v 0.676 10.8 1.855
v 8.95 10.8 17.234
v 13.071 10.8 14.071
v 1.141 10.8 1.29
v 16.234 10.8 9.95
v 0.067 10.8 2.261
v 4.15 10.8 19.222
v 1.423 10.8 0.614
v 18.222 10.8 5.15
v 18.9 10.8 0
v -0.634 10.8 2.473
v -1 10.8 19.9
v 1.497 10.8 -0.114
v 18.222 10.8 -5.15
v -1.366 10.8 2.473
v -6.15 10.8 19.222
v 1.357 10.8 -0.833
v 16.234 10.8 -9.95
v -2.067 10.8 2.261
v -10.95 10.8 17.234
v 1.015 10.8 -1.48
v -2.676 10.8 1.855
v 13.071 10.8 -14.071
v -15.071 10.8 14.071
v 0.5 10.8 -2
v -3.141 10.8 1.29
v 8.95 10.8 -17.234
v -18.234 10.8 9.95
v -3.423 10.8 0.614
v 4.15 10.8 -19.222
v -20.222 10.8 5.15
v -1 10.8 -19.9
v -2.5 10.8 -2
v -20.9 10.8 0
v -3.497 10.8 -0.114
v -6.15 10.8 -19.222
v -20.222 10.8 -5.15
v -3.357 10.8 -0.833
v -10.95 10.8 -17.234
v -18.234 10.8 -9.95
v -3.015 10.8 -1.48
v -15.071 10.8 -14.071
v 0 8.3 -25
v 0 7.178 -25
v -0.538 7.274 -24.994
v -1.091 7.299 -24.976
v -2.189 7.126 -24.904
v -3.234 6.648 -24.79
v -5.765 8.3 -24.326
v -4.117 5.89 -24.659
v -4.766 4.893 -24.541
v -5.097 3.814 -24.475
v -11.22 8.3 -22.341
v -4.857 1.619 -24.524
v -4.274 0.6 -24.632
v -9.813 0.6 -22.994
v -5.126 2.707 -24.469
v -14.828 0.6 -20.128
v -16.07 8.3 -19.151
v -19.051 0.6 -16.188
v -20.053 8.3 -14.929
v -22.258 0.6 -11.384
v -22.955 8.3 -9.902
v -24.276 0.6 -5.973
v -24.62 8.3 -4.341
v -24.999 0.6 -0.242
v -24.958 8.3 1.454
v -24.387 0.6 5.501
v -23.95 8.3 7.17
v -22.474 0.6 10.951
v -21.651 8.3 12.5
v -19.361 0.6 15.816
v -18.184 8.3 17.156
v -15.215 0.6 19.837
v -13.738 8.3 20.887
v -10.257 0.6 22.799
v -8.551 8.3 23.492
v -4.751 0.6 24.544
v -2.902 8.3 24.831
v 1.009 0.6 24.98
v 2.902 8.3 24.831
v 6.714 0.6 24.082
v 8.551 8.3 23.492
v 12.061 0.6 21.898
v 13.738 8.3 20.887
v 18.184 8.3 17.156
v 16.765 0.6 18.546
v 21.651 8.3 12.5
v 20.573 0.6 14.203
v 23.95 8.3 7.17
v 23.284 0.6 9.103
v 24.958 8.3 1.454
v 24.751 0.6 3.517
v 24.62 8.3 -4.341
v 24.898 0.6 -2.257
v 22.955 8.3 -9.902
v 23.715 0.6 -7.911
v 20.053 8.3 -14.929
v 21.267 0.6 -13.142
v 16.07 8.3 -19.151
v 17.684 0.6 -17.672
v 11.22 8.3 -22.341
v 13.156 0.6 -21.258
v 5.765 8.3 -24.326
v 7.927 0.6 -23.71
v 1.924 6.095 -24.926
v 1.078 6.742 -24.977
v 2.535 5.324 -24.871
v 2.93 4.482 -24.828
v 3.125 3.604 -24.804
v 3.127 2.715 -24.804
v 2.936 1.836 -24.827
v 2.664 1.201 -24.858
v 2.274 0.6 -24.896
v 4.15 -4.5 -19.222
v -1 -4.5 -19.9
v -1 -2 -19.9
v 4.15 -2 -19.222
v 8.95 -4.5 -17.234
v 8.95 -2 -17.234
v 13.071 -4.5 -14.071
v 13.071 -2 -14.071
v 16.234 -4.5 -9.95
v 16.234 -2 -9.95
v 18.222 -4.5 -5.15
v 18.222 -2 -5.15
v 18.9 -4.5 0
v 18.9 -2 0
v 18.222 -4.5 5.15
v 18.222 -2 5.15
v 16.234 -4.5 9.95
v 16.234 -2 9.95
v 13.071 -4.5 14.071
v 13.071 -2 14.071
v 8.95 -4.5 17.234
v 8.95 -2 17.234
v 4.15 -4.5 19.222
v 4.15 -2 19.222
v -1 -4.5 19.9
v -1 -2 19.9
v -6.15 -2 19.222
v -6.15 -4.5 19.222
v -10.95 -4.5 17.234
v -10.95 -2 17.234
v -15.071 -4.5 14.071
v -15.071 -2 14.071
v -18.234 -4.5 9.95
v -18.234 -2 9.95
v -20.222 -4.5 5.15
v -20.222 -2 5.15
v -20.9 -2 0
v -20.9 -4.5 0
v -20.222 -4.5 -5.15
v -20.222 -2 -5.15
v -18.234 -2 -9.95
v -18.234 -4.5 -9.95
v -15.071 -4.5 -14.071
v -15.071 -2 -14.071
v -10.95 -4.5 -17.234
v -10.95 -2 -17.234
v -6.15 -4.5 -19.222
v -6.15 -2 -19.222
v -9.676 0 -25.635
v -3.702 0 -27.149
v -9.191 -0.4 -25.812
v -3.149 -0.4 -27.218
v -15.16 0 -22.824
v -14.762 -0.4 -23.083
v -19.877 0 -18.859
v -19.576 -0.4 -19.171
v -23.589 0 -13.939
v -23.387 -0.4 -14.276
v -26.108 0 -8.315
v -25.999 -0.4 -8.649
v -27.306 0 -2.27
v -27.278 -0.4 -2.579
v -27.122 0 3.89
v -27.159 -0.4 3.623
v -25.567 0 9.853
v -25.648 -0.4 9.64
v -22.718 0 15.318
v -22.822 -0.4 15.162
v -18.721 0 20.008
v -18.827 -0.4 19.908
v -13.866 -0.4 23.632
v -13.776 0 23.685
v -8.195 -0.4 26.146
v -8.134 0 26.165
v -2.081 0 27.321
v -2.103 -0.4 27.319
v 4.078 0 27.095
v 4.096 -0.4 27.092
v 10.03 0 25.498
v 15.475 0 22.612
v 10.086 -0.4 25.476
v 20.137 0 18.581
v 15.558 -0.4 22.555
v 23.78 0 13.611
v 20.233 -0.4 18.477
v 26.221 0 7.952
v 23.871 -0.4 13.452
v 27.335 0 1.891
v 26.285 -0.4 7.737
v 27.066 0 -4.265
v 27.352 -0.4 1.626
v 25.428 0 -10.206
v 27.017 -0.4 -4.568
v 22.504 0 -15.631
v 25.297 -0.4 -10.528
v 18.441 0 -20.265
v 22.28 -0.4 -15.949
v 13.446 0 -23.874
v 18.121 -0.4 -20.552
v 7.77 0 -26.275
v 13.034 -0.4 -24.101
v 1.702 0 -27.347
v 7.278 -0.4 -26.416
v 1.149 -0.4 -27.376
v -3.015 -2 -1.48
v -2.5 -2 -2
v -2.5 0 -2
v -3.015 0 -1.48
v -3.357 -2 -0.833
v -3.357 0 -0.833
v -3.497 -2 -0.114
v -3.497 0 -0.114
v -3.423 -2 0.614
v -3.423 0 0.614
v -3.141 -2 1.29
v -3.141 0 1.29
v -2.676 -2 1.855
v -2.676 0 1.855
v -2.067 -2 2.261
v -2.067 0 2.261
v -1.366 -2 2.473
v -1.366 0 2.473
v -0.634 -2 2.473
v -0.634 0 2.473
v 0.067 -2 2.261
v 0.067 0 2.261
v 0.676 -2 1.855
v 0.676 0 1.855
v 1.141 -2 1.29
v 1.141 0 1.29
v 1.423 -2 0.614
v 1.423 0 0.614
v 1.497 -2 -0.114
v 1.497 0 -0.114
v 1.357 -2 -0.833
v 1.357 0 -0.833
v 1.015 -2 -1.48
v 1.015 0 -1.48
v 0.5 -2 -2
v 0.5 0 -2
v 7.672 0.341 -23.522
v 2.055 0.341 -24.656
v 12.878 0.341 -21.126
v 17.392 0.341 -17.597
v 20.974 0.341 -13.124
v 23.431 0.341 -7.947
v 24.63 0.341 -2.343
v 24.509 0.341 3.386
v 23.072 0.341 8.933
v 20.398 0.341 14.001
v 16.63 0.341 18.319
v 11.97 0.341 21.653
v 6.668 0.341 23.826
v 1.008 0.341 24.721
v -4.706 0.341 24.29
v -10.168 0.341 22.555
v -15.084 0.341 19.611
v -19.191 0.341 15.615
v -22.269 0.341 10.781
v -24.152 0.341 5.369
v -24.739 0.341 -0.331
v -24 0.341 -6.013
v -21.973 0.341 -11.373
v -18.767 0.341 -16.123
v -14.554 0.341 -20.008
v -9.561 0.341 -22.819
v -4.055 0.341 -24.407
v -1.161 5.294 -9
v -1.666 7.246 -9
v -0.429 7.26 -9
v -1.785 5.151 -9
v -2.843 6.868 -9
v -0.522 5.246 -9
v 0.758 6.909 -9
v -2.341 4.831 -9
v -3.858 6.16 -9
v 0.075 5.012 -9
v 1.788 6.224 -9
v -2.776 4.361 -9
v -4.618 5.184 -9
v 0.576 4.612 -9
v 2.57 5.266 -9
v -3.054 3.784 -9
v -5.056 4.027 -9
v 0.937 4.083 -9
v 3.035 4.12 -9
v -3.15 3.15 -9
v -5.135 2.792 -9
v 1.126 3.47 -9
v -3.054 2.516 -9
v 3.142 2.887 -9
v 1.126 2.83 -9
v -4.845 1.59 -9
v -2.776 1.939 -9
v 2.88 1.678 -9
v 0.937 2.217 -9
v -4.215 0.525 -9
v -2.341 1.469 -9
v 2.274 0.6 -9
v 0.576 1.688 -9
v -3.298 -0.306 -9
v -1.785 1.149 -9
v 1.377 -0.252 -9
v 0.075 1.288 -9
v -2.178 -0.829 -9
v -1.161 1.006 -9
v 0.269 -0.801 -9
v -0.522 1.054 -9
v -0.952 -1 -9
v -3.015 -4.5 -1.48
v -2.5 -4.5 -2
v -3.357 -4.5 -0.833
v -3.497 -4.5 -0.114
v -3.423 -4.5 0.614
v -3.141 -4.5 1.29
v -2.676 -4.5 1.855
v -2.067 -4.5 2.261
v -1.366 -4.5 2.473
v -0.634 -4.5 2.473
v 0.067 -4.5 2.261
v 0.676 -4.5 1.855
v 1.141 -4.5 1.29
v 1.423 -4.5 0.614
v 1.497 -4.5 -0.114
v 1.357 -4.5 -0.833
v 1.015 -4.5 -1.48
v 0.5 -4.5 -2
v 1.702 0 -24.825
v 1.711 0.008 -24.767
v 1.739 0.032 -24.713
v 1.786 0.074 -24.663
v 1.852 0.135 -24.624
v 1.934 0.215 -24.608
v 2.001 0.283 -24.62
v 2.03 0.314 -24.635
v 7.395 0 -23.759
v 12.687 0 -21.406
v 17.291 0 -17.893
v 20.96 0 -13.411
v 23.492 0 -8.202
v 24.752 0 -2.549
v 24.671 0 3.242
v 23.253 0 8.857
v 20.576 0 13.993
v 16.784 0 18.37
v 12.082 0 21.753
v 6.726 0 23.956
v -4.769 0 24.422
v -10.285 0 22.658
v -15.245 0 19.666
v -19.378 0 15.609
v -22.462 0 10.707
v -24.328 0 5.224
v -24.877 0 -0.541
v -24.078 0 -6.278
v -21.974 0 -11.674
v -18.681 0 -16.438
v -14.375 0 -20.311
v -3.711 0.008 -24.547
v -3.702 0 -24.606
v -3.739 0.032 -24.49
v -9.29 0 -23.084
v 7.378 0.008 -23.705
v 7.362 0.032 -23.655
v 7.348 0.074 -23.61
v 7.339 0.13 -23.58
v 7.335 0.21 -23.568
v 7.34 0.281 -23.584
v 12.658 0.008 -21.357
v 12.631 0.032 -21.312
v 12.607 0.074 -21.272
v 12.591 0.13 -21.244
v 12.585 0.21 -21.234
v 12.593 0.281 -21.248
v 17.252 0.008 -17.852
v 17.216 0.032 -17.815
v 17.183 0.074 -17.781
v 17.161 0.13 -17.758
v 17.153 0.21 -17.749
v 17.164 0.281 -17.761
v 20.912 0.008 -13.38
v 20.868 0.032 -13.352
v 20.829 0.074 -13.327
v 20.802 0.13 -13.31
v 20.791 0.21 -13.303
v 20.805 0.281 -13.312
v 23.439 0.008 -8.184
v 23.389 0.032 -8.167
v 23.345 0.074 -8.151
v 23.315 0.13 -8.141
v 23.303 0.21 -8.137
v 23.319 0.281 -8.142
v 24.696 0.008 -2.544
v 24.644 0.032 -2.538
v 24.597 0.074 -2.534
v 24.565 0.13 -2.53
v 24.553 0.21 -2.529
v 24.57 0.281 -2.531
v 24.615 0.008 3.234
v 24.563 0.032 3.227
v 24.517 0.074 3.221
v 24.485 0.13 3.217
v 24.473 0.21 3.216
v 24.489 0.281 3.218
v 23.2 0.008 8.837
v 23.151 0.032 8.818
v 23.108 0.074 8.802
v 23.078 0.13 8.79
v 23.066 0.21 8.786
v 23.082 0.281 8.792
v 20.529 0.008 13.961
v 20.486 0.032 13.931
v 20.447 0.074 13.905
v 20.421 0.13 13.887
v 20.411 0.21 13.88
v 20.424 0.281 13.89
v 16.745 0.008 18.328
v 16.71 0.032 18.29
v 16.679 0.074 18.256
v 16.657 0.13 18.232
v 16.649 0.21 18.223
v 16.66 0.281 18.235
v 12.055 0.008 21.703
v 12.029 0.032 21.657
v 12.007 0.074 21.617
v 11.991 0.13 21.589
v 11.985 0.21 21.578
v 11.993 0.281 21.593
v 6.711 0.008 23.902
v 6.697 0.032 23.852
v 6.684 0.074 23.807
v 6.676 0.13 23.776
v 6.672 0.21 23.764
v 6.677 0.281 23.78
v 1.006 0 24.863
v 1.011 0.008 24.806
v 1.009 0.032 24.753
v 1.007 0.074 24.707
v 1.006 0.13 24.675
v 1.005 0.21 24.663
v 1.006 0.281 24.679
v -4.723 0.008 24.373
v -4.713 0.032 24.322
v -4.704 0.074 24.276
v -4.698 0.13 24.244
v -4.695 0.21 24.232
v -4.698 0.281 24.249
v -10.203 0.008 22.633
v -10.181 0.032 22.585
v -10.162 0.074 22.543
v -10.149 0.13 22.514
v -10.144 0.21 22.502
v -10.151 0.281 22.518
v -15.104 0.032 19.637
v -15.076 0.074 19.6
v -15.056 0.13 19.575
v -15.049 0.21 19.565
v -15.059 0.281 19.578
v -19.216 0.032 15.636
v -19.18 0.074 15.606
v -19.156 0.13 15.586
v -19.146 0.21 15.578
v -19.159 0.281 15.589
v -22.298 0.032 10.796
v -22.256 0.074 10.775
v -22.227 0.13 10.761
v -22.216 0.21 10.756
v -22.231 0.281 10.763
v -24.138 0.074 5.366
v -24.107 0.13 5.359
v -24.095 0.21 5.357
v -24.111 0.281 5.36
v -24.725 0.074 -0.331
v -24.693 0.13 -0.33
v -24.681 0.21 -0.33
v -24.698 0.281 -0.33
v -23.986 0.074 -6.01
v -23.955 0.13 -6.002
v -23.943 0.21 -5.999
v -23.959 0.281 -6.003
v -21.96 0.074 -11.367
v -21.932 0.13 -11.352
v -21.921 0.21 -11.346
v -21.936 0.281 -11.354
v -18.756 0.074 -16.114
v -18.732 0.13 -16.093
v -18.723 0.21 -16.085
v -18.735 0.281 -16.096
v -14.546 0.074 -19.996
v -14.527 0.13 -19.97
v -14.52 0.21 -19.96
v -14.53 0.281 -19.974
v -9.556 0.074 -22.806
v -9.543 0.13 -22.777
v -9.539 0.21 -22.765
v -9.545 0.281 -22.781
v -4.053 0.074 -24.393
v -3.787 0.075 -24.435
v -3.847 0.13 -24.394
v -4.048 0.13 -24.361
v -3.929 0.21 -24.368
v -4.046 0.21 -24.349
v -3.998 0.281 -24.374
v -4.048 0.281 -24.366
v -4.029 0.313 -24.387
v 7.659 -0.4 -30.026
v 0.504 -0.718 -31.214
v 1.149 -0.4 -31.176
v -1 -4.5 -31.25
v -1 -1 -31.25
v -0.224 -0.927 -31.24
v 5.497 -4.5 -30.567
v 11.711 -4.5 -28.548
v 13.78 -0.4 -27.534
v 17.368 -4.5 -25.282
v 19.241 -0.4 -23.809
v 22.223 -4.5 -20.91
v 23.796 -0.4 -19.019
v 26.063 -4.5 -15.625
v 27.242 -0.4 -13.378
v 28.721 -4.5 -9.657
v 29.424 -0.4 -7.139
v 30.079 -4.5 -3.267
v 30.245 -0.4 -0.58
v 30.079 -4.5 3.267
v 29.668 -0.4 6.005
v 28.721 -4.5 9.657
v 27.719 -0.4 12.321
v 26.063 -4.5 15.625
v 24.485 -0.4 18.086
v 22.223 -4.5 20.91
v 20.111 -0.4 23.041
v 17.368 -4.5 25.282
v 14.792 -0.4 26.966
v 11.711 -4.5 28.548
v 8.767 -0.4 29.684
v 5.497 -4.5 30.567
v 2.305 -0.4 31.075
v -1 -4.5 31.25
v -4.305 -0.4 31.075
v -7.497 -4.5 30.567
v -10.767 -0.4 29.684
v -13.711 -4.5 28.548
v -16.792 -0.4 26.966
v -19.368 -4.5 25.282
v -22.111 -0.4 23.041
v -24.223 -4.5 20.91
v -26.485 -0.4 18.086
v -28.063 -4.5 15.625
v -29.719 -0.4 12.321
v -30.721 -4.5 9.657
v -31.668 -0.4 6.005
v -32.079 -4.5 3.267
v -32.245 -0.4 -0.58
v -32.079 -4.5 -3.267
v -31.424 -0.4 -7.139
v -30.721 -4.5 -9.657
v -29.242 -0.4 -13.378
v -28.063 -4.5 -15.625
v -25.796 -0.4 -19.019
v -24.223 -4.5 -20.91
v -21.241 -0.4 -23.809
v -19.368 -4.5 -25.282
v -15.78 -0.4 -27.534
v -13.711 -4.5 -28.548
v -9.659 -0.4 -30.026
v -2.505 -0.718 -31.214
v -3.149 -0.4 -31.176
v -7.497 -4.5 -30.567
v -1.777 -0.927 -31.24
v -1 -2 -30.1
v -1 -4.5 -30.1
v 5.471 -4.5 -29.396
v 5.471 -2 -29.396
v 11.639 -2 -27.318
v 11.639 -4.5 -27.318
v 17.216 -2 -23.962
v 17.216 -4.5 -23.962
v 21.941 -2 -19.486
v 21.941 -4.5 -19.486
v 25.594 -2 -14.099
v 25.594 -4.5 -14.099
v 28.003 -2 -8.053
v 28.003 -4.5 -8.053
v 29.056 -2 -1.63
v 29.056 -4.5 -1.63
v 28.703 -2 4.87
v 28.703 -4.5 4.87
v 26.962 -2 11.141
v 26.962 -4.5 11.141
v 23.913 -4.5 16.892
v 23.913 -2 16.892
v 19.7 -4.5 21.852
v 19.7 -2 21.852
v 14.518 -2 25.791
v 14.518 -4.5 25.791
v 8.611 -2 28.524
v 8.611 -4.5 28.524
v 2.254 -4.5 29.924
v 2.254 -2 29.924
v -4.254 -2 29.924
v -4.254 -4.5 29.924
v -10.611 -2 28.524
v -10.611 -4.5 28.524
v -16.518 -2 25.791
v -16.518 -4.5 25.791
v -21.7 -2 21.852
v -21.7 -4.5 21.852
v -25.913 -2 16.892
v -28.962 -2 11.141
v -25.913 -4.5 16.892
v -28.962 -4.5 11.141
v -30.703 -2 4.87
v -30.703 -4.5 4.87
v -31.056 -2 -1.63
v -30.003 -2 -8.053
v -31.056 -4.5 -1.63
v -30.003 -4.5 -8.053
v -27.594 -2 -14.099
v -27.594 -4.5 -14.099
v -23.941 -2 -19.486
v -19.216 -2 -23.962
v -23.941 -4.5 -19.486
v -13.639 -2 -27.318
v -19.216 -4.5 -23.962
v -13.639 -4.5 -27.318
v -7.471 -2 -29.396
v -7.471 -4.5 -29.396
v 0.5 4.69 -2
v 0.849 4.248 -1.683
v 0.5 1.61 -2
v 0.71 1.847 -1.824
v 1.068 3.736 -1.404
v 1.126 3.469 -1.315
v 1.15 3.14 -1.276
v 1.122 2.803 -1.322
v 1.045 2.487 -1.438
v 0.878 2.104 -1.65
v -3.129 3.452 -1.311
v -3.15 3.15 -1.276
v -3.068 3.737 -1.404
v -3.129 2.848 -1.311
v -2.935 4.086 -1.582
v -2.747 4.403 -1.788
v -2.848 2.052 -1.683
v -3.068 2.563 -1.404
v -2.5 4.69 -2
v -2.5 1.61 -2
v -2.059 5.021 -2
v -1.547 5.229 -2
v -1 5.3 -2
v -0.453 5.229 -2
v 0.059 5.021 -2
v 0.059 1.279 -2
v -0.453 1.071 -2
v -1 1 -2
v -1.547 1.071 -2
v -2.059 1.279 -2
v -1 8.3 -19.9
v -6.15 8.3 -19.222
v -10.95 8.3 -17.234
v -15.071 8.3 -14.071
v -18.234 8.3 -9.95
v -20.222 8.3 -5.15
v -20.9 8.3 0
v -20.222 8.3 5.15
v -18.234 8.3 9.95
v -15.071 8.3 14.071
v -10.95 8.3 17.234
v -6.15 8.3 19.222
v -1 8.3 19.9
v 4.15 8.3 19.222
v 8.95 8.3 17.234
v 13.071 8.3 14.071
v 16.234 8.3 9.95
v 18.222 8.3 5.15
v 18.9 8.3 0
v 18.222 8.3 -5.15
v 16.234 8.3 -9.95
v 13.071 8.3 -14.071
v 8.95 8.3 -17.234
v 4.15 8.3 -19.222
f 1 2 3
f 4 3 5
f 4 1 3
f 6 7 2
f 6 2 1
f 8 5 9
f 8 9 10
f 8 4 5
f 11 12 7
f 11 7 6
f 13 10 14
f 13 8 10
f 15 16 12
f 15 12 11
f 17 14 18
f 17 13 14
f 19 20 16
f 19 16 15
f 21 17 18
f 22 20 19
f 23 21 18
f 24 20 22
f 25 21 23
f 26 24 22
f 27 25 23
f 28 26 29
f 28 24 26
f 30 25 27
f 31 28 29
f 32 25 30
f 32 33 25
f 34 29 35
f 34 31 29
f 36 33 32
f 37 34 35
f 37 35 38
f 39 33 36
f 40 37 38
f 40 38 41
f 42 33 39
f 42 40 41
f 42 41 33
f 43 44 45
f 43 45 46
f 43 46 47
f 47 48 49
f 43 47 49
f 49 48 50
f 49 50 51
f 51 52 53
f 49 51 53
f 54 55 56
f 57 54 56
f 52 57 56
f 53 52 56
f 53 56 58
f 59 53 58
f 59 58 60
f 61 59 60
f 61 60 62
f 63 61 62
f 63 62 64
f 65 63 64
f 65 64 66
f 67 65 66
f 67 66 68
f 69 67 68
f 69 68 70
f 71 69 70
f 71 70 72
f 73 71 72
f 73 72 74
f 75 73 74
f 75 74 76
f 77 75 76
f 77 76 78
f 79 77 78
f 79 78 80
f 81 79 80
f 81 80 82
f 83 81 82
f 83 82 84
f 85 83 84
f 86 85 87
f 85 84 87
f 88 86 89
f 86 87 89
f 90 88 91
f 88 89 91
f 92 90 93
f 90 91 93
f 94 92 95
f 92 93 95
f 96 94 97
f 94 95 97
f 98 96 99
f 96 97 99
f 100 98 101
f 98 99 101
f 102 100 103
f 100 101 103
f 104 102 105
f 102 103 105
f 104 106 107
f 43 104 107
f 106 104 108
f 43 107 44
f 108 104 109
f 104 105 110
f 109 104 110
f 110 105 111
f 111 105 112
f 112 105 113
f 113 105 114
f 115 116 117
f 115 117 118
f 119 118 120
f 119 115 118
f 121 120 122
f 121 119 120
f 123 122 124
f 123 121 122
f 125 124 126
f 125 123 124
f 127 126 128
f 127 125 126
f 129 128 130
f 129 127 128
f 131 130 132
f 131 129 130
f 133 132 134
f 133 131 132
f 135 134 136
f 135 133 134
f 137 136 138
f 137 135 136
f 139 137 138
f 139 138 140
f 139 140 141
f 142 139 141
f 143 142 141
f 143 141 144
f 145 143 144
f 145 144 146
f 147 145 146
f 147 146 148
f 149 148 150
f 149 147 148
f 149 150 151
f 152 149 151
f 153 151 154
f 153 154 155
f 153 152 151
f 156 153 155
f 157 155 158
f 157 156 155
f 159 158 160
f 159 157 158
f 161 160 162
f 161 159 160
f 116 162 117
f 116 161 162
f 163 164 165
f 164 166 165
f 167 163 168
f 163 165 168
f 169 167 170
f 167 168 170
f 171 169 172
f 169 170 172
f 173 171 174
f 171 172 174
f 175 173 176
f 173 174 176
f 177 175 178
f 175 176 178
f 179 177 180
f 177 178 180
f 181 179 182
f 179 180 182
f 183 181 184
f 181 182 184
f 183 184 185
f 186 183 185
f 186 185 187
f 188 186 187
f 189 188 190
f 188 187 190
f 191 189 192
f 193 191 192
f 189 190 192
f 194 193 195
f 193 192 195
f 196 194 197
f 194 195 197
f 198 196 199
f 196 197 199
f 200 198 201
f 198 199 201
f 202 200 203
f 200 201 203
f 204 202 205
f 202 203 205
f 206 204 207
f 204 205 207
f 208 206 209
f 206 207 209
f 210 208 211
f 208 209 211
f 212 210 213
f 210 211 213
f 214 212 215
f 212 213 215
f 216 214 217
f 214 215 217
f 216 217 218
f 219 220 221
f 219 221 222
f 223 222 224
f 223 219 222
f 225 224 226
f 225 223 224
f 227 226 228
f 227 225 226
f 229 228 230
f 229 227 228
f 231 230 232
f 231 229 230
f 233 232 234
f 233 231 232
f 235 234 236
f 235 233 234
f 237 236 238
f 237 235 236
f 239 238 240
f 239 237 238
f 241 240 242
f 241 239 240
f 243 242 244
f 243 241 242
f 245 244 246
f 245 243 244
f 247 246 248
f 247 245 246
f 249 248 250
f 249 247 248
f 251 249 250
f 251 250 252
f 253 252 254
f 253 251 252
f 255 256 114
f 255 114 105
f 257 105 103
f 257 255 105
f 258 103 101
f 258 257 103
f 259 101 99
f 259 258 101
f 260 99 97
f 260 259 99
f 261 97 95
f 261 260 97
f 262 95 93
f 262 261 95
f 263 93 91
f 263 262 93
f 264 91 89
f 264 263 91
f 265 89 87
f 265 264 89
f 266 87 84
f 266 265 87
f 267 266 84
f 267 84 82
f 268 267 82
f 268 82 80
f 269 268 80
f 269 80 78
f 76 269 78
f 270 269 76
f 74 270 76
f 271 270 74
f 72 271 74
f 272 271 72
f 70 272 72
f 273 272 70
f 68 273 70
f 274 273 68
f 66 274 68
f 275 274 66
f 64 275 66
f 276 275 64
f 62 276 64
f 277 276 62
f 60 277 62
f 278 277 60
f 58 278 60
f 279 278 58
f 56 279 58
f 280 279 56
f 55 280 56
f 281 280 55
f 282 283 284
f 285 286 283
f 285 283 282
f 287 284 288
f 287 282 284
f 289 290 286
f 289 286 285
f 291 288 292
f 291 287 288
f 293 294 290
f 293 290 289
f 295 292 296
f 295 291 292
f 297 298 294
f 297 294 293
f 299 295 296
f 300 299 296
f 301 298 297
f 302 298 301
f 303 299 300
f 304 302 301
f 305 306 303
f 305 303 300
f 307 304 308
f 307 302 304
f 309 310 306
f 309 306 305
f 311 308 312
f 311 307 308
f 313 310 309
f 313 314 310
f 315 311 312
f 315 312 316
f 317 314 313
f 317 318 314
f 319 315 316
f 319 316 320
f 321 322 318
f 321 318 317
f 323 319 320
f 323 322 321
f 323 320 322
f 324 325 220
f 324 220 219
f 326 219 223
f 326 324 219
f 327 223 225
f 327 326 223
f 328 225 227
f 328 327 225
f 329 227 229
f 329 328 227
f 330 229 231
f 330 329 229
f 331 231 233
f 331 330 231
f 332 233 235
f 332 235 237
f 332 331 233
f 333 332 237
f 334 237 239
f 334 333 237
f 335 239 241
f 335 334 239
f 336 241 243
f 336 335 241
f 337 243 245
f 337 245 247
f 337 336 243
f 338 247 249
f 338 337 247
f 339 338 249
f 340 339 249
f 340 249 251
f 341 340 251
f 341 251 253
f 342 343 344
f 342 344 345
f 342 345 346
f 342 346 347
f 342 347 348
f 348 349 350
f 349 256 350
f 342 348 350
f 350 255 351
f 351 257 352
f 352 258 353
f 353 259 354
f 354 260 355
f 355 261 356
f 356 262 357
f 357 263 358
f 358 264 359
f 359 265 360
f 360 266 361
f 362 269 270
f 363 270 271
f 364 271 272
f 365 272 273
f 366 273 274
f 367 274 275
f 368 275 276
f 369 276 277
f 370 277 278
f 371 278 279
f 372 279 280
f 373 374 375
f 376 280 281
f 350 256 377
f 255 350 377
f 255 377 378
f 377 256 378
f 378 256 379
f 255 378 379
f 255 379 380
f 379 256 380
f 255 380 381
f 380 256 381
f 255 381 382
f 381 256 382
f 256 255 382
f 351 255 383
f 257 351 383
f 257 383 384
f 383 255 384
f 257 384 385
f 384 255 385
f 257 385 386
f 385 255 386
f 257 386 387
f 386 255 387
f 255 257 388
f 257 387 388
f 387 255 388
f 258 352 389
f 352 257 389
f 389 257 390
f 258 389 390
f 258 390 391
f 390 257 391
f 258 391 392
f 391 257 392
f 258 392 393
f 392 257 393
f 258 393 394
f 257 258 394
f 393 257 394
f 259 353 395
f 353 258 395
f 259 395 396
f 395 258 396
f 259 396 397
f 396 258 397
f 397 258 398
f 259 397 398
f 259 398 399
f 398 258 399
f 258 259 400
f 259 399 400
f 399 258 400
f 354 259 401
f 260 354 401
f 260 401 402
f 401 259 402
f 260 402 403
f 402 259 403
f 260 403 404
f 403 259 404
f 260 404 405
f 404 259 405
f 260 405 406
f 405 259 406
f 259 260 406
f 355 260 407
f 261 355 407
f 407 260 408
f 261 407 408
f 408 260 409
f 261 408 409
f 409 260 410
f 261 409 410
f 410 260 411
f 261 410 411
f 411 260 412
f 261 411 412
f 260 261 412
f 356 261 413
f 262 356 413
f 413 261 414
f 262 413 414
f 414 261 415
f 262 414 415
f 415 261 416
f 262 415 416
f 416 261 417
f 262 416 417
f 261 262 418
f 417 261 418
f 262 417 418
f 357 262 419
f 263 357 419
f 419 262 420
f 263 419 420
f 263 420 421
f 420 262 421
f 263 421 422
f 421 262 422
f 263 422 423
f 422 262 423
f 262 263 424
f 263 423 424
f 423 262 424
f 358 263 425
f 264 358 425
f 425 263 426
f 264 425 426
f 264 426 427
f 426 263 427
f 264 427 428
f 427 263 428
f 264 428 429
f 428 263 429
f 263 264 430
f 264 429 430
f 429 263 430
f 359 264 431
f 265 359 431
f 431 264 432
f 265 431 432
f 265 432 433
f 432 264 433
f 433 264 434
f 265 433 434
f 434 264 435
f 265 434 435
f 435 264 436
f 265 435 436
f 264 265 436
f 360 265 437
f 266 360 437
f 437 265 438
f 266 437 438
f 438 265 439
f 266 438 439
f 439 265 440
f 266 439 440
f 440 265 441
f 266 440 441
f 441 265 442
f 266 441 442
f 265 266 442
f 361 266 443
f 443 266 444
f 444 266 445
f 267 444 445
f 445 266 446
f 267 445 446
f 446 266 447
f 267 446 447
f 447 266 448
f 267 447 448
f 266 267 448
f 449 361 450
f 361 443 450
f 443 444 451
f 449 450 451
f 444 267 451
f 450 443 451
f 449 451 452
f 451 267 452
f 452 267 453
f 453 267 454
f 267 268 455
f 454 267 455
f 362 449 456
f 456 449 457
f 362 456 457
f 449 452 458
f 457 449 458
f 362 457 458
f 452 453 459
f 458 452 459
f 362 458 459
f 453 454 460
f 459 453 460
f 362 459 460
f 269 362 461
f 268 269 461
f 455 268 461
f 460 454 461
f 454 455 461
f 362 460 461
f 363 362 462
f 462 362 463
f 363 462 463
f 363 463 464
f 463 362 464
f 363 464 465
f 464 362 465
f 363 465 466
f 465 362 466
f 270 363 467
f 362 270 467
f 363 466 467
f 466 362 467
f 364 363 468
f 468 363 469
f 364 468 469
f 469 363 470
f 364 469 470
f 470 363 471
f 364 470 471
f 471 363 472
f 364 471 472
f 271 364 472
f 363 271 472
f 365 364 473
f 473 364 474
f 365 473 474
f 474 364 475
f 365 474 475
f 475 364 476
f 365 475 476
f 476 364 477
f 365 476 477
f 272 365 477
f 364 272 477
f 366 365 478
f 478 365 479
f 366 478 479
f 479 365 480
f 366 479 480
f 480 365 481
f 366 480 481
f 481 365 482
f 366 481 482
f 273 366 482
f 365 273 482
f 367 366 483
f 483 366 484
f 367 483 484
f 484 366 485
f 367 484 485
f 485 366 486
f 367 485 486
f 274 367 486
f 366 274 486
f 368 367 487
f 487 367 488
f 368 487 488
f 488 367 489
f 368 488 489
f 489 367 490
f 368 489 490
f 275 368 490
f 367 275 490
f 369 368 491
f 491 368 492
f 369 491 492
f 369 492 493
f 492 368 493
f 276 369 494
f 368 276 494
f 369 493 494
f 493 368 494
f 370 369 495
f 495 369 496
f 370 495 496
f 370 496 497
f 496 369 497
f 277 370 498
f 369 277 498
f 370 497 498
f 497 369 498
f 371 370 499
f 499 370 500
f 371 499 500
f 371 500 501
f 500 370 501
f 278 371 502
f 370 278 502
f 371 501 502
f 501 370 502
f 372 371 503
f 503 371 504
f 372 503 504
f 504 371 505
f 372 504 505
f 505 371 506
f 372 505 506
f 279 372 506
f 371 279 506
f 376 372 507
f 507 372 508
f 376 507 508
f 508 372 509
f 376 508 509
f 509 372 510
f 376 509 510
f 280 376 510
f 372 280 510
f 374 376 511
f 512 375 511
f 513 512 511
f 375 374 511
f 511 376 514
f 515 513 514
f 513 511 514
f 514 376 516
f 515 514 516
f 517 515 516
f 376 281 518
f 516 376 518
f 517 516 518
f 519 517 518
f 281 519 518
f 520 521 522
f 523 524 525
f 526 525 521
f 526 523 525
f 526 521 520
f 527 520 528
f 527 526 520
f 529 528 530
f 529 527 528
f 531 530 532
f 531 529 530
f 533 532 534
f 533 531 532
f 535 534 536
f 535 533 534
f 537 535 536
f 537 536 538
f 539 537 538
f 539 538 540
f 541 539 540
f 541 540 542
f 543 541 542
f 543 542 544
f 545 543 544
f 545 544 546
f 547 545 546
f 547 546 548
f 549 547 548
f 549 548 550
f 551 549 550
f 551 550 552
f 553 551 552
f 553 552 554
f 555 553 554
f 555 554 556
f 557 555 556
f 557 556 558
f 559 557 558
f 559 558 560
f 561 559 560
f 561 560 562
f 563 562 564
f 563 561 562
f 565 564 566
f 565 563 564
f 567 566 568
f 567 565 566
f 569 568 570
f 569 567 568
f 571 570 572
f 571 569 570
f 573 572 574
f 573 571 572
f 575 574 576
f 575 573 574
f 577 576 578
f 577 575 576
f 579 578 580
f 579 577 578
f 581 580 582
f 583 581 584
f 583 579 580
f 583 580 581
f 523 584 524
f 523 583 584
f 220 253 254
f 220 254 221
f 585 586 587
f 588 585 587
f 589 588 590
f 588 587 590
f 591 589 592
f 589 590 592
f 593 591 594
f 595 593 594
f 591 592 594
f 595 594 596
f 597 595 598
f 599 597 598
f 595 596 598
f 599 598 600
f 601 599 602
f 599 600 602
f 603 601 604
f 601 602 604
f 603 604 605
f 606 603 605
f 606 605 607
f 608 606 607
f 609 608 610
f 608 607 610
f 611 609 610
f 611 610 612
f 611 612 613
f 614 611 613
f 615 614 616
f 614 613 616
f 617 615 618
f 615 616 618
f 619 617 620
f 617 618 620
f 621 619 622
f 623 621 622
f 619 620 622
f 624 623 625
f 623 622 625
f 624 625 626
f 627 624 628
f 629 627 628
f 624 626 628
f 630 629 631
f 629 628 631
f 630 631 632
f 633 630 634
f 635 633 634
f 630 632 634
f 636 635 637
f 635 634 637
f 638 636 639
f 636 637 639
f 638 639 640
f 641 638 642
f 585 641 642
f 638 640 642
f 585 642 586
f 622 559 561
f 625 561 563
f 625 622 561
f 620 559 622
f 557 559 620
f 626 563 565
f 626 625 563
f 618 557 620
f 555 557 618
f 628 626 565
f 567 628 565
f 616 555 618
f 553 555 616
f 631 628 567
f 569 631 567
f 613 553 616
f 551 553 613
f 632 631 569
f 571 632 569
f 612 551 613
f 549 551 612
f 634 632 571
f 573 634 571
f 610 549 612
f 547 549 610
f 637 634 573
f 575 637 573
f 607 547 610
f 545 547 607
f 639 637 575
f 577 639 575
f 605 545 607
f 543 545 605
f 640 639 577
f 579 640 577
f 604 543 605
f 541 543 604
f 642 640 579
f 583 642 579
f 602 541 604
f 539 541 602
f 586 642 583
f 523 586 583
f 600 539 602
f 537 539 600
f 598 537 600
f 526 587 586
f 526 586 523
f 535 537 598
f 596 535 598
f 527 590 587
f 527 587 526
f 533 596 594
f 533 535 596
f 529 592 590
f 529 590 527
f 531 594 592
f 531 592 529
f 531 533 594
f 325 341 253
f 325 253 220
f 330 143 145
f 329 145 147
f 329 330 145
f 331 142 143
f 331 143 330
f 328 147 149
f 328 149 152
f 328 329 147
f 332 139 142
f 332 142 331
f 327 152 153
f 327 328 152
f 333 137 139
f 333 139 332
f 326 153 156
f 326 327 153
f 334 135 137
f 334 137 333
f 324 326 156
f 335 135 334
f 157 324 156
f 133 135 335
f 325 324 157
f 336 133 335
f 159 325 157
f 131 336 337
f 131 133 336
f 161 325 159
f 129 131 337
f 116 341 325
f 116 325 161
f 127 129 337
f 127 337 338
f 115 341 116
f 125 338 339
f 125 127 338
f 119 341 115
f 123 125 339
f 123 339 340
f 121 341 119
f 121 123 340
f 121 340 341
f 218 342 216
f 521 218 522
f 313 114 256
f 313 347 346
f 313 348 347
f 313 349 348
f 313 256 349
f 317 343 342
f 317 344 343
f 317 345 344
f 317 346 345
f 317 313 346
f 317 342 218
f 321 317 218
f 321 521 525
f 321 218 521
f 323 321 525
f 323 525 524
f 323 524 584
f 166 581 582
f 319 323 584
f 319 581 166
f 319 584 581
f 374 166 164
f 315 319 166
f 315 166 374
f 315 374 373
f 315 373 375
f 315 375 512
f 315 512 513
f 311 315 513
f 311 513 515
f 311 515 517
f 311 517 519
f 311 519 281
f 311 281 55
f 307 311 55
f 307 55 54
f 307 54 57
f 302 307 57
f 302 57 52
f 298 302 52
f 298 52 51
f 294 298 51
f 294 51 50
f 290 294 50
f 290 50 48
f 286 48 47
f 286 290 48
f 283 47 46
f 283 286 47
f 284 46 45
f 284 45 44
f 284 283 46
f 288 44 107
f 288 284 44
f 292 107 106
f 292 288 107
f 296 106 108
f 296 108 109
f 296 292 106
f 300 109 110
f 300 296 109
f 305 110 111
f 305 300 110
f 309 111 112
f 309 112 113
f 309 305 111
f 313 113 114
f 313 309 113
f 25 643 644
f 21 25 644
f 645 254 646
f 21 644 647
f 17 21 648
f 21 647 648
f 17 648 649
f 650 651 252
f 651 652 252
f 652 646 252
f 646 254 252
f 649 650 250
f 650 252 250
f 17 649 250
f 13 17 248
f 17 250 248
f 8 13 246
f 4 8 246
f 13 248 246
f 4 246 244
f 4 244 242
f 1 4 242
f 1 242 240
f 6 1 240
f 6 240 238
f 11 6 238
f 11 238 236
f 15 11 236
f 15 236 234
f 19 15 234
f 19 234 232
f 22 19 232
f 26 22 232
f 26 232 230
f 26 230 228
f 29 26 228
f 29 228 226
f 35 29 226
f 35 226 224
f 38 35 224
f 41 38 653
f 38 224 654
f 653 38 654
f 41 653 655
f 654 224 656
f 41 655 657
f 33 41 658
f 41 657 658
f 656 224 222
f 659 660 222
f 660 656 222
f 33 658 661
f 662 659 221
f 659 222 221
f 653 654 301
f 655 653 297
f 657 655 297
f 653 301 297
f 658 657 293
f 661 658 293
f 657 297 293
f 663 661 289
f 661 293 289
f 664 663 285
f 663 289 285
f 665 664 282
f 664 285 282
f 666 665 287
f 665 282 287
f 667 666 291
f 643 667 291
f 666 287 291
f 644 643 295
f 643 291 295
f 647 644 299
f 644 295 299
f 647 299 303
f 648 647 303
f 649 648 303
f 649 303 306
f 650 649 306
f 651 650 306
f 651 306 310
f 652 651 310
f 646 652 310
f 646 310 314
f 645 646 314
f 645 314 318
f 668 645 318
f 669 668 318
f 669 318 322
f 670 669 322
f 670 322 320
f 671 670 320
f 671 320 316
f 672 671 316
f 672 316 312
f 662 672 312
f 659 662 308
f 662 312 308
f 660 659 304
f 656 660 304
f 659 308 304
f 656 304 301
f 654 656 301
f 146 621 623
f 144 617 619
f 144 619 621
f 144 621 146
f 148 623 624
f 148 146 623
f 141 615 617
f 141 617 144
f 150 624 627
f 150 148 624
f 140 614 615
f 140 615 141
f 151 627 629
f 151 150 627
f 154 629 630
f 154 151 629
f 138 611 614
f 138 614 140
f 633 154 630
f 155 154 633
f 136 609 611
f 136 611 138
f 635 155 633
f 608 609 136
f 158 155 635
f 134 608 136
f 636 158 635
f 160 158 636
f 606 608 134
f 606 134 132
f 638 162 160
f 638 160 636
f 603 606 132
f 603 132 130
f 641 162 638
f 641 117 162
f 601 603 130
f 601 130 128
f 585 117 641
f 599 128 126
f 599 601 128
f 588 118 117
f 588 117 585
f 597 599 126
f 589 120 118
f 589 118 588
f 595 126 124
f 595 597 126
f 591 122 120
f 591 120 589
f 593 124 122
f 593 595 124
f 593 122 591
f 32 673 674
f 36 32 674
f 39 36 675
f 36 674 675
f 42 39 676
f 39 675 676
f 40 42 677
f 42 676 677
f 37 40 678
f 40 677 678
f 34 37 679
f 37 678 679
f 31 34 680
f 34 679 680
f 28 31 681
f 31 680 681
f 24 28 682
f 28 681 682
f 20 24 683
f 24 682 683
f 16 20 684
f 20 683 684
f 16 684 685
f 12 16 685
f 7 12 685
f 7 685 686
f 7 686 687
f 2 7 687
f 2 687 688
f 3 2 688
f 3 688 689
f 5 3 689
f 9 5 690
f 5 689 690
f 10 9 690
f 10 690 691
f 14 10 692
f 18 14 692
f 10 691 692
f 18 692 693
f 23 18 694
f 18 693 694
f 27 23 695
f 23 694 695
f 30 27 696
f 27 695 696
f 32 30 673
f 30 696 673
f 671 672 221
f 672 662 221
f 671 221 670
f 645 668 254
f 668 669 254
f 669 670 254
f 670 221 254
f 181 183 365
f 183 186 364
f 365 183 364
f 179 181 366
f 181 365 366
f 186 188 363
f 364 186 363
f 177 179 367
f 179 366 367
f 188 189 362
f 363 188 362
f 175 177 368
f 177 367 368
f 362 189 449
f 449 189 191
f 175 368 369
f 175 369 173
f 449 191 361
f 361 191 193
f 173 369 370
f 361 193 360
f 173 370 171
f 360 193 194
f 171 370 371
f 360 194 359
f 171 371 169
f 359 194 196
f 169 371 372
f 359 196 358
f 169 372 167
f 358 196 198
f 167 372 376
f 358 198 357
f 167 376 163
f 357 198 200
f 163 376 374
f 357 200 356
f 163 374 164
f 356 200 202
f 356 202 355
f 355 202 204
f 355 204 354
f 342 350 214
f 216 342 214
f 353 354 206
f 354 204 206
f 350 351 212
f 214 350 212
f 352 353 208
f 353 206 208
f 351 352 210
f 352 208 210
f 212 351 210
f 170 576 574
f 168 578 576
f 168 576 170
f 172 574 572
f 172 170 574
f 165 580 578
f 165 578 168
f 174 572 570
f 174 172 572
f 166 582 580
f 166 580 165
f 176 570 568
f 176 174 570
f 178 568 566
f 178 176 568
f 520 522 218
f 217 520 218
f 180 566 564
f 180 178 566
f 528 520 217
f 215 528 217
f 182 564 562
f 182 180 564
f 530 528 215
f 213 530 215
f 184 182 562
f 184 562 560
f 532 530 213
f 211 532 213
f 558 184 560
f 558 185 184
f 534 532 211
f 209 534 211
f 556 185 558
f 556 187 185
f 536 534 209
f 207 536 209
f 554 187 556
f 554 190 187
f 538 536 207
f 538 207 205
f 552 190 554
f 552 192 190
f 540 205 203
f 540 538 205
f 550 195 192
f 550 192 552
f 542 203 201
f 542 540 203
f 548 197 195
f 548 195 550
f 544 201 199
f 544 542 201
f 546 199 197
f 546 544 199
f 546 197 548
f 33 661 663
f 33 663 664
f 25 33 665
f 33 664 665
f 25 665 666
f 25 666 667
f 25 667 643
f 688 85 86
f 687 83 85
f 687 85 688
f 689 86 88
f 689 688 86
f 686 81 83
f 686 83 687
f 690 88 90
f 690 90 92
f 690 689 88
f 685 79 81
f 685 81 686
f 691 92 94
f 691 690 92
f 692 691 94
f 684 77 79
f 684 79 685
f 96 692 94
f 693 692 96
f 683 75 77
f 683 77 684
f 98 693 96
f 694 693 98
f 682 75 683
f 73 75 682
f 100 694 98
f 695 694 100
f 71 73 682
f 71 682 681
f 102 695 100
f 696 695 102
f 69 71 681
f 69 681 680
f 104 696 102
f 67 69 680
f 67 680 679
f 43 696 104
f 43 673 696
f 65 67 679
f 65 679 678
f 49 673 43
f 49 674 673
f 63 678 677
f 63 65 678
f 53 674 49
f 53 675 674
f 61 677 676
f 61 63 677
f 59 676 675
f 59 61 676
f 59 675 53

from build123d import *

# Parameters (mm, degrees)
SKETCH1_R                      = 25
BOSS_EXTRUDE1_DEPTH            = 10.8
BOSS_EXTRUDE2_START            = 2
SKETCH2_R                      = 31.25
BOSS_EXTRUDE2_DEPTH            = 2
BOSS_EXTRUDE3_START            = 2.5
SKETCH3_R                      = 31.25
SKETCH3_R_2                    = 30.1
SKETCH3_R_3                    = 19.9
BOSS_EXTRUDE3_DEPTH            = 2.5
CUT_EXTRUDE1_START             = -0.4
SKETCH4_R                      = 31.25
SKETCH4_R_2                    = 27.4
CUT_EXTRUDE1_DEPTH             = 0.4
CUT_EXTRUDE2_START             = -2.5
SKETCH5_R                      = 25
SKETCH5_R_2                    = 19.9
CUT_EXTRUDE2_DEPTH             = 2.5
FILLET1_R                      = 0.2
CUT_EXTRUDE3_REACH             = 67.733
SKETCH7_R                      = 2.15
CUT_EXTRUDE3_DIRECTION_2_DEPTH = 66.732526195
CUT_EXTRUDE4_DEPTH             = 66.732526212
CUT_EXTRUDE4_DEPTH_BACK        = 16
SKETCH8_R                      = 4.15


with BuildPart() as part:
    # Sketch1 → Boss-Extrude1 (new body)
    with BuildSketch(Plane(origin=(0, 0, 0), x_dir=(1, 0, 0), z_dir=(0, 1, 0))):
        with Locations(Location((0, 0, 0), (0, 0, 90))):
            Circle(SKETCH1_R)
        with BuildLine():
            Line((-2.5, 2), (0.5, 2))
            ThreePointArc((0.5, 2), (-1, -2.5), (-2.5, 2))
        make_face(mode=Mode.SUBTRACT)
    extrude(amount=BOSS_EXTRUDE1_DEPTH)

    # Sketch2 → Boss-Extrude2 (add)
    with BuildSketch(Plane.XZ.offset(BOSS_EXTRUDE2_START)):
        with Locations(Location((-1, 0, 0), (0, 0, 270))):
            Circle(SKETCH2_R)
        with BuildLine():
            Line((0.5, -2), (-2.5, -2))
            ThreePointArc((-2.5, -2), (-1, 2.5), (0.5, -2))
        make_face(mode=Mode.SUBTRACT)
    extrude(amount=-BOSS_EXTRUDE2_DEPTH)

    # Sketch3 → Boss-Extrude3 (add)
    # profile 1 of 2: a face of its own
    with BuildSketch(Plane.XZ.offset(2).offset(BOSS_EXTRUDE3_START)):
        with Locations(Location((-1, 0, 0), (0, 0, 270))):
            Circle(SKETCH3_R)
        with Locations(Location((-1, 0, 0), (0, 0, 270))):
            Circle(SKETCH3_R_2, mode=Mode.SUBTRACT)
    # profile 2 of 2: a face of its own
    with BuildSketch(Plane.XZ.offset(2).offset(BOSS_EXTRUDE3_START)):
        with Locations(Location((-1, 0, 0), (0, 0, 270))):
            Circle(SKETCH3_R_3)
        with BuildLine():
            Line((0.5, -2), (-2.5, -2))
            ThreePointArc((-2.5, -2), (-1, 2.5), (0.5, -2))
        make_face(mode=Mode.SUBTRACT)
    extrude(amount=-BOSS_EXTRUDE3_DEPTH)

    # Sketch4 → Cut-Extrude1 (cut)
    with BuildSketch(Plane(origin=(0, 0, 0), x_dir=(1, 0, 0), z_dir=(0, 1, 0)).offset(CUT_EXTRUDE1_START)):
        with Locations(Location((-1, 0, 0), (0, 0, 270))):
            Circle(SKETCH4_R)
        with Locations(Location((0, 0, 0), (0, 0, 270))):
            Circle(SKETCH4_R_2, mode=Mode.SUBTRACT)
    extrude(amount=CUT_EXTRUDE1_DEPTH, mode=Mode.SUBTRACT)

    # Sketch5 → Cut-Extrude2 (cut)
    with BuildSketch(Plane(origin=(0, 10.8, 0), x_dir=(1, 0, 0), z_dir=(0, 1, 0)).offset(CUT_EXTRUDE2_START)):
        with Locations(Location((0, 0, 0), (0, 0, 90))):
            Circle(SKETCH5_R)
        with Locations(Location((-1, 0, 0), (0, 0, 90))):
            Circle(SKETCH5_R_2, mode=Mode.SUBTRACT)
    extrude(amount=CUT_EXTRUDE2_DEPTH, mode=Mode.SUBTRACT)

    # Sketch6 → Cut-Revolve1 (revolve, cut)
    with BuildSketch(Plane.XY, mode=Mode.PRIVATE) as cut_revolve1_sk:
        Polygon((-25, 0), (-25, 0.6), (-24.4, 0), align=None)
    revolve(cut_revolve1_sk.sketch.rotate(Axis((0, 8.3, 0), (0, -1, 0)), 90), axis=Axis((0, 8.3, 0), (0, -1, 0)), mode=Mode.SUBTRACT)

    # Fillet1
    fillet1_edges = [part.edges().sort_by_distance(p)[0] for p in [
        (0, 0, 24.4),
    ]]
    fillet(fillet1_edges, radius=FILLET1_R)

    # Sketch7 → Cut-Extrude3 (cut, up to next)
    with BuildSketch(Plane(origin=(0, 0, -25), x_dir=(-1, 0, 0), z_dir=(0, 0, -1)), mode=Mode.PRIVATE) as cut_extrude3_sk1:
        with Locations((1, 3.15)):
            Circle(SKETCH7_R)
    cut_extrude3_tool1 = extrude(cut_extrude3_sk1.sketch, amount=-CUT_EXTRUDE3_REACH, mode=Mode.PRIVATE) & part.part
    add(cut_extrude3_tool1.solids().sort_by_distance((-1, 3.15, -25))[0], mode=Mode.SUBTRACT)

    # Sketch7 → Cut-Extrude3 direction 2 (cut)
    with BuildSketch(Plane(origin=(0, 0, -25), x_dir=(-1, 0, 0), z_dir=(0, 0, -1))):
        with Locations((1, 3.15)):
            Circle(SKETCH7_R)
    extrude(amount=CUT_EXTRUDE3_DIRECTION_2_DEPTH, mode=Mode.SUBTRACT)

    # Sketch8 → Cut-Extrude4 (cut, two sides: drawn at the far end of the back side and taken through both)
    with BuildSketch(Plane(origin=(0, 0, -25), x_dir=(-1, 0, 0), z_dir=(0, 0, -1)).offset(-CUT_EXTRUDE4_DEPTH_BACK)):
        with Locations(Location((1, 3.15, 0), (0, 0, 217.912535811))):
            Circle(SKETCH8_R)
    extrude(amount=CUT_EXTRUDE4_DEPTH + CUT_EXTRUDE4_DEPTH_BACK, mode=Mode.SUBTRACT)


solid = part.part
